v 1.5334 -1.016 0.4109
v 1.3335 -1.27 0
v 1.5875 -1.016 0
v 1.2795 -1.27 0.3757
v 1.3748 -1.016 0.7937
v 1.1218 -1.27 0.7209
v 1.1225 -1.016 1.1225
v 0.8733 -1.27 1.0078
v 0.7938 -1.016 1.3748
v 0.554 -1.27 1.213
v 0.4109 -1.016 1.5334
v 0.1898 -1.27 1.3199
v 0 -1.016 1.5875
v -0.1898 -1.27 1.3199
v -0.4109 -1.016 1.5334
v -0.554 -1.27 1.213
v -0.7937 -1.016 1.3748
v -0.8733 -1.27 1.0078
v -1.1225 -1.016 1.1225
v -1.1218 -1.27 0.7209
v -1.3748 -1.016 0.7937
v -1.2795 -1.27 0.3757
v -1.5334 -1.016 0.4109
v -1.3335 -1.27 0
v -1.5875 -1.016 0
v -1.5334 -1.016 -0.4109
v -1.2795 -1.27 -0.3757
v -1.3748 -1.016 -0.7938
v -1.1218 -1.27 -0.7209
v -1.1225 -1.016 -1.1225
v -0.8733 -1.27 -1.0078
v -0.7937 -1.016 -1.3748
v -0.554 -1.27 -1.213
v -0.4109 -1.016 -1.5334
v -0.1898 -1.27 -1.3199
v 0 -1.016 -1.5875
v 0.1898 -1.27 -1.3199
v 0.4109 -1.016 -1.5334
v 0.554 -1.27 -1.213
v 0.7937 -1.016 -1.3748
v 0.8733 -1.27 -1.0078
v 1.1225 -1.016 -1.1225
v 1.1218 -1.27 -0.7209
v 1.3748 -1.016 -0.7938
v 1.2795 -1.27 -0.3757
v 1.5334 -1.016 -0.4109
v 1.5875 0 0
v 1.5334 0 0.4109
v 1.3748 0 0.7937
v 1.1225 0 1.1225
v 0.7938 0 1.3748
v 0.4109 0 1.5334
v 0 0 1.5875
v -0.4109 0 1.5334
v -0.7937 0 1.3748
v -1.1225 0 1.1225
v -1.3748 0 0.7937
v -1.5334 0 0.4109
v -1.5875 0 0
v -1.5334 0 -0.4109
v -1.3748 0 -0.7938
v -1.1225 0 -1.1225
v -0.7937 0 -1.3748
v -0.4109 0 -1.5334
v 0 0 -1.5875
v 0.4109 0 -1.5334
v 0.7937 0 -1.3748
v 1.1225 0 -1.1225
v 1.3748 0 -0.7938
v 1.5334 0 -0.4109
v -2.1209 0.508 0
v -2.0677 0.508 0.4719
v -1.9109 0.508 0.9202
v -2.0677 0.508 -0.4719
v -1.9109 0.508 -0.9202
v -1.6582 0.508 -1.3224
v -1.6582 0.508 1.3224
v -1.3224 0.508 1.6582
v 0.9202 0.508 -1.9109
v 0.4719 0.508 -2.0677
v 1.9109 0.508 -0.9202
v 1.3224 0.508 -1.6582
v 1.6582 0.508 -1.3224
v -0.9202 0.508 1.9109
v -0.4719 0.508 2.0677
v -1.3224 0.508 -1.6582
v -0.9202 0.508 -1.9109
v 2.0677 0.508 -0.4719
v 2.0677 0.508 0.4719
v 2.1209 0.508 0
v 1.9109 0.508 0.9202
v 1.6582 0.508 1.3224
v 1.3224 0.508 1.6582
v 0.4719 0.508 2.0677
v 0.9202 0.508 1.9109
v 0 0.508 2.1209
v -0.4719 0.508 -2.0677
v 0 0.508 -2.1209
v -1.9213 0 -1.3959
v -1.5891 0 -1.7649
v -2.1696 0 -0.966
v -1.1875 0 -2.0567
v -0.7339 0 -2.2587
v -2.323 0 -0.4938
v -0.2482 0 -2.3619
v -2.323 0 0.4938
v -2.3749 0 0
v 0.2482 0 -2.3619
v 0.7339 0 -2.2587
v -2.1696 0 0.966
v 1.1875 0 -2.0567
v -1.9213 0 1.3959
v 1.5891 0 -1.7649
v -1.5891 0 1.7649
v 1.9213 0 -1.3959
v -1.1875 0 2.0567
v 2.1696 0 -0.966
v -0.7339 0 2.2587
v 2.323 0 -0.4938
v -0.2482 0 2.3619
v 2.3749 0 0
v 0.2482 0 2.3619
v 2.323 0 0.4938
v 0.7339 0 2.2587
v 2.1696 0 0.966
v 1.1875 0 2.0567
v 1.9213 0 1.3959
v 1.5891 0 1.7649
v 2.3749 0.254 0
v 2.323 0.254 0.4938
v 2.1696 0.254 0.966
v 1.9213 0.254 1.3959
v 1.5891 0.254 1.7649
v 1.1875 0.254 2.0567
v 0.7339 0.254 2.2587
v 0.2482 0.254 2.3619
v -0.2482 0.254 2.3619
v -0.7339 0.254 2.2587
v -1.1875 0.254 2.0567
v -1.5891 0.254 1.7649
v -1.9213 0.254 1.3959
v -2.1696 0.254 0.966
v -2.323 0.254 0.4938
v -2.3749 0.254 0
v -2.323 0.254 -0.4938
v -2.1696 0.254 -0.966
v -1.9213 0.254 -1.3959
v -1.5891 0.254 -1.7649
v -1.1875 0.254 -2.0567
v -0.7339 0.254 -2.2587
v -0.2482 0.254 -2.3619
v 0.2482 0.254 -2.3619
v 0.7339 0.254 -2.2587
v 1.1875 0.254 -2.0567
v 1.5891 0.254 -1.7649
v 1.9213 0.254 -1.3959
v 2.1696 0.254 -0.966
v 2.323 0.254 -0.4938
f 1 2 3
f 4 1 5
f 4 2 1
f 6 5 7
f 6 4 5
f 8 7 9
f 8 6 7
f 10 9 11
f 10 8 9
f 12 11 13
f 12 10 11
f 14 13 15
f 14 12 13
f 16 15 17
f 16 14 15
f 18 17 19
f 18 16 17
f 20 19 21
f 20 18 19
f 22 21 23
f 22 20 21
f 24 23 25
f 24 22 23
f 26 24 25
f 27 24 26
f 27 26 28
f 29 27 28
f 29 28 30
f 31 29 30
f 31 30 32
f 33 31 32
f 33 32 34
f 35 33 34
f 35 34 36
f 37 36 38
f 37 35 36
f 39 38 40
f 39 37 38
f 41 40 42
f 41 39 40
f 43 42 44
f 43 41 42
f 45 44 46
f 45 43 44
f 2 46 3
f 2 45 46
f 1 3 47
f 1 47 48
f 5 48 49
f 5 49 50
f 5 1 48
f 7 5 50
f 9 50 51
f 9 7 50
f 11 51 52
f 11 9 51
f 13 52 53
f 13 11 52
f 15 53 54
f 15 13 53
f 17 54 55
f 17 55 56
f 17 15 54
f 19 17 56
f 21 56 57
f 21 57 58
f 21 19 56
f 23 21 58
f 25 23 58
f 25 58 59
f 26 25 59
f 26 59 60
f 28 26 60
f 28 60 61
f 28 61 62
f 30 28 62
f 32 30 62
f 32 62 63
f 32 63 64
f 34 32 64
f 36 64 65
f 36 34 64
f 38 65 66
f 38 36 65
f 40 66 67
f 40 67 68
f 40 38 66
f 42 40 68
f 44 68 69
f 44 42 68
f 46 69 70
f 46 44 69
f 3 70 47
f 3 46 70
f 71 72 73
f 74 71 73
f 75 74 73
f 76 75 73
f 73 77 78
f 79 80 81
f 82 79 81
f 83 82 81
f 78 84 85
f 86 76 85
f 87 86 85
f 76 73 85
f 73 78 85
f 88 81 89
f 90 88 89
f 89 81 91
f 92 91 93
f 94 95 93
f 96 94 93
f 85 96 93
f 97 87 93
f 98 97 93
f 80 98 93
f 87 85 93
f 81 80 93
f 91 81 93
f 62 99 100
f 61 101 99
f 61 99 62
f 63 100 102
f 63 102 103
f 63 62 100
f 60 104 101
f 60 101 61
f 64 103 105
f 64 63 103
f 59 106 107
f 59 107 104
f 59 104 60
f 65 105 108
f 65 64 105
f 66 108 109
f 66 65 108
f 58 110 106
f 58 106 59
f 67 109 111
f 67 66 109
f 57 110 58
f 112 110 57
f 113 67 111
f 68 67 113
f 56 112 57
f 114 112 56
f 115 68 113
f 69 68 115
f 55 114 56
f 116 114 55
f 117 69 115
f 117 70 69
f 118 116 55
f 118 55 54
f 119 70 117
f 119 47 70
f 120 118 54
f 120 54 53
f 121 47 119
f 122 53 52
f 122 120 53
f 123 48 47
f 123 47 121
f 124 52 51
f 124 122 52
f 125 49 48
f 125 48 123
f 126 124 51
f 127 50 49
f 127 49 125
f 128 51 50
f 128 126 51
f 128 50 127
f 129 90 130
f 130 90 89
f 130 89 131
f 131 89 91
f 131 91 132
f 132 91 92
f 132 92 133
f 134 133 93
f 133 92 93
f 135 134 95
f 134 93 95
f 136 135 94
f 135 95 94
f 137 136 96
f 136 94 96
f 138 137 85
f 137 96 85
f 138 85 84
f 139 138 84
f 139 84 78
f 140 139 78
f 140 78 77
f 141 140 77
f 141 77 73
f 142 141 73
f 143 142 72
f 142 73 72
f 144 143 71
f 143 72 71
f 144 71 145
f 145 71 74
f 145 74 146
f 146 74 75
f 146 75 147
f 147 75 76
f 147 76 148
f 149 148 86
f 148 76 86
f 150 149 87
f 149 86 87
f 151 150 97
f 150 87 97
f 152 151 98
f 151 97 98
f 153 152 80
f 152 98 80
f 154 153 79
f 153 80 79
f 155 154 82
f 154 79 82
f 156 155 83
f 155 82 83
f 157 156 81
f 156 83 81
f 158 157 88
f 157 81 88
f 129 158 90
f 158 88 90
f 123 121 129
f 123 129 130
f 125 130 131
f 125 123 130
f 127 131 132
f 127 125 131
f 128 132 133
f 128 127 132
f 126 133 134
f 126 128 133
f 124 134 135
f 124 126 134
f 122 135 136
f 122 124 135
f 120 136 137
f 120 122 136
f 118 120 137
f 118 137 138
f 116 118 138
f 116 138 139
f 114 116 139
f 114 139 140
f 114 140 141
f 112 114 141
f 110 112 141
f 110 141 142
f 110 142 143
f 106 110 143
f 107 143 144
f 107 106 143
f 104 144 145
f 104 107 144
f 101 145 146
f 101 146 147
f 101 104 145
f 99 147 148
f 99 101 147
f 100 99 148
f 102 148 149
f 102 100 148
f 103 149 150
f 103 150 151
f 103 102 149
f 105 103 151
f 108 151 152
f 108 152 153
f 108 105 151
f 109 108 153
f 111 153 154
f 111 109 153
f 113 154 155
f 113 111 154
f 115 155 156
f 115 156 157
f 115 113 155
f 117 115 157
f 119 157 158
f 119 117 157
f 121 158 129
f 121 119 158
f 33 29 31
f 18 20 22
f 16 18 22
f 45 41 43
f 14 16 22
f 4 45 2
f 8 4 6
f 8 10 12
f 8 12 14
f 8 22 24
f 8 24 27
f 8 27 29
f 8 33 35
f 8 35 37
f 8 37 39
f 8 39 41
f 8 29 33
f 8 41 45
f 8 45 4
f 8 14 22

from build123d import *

# Parameters (mm, degrees)
F0_R          = 1.5875
F1_DEPTH      = 1.27
F1_DEPTH_BACK = 0.508
F0_R_2        = 2.3749
F2_DEPTH      = 0.508
F3_SIZE       = 0.254


with BuildPart() as f1:
    # F0 (on Front) → F1 (new body, two sides)
    with BuildSketch(Plane.XZ) as f1_sk:
        Circle(F0_R)
    extrude(amount=F1_DEPTH)
    extrude(f1_sk.sketch, amount=-F1_DEPTH_BACK)

    # F0 (on Front) → F2 (join)
    with BuildSketch(Plane.XZ):
        Circle(F0_R_2)
        Circle(F0_R, mode=Mode.SUBTRACT)
    extrude(amount=-F2_DEPTH)

    # F3
    f3_edges = [f1.edges().sort_by_distance(p)[0] for p in [
        (-2.3749, 0.508, 0),
        (-1.5875, -1.27, 0),
    ]]
    chamfer(f3_edges, length=F3_SIZE)


solid = f1.part
